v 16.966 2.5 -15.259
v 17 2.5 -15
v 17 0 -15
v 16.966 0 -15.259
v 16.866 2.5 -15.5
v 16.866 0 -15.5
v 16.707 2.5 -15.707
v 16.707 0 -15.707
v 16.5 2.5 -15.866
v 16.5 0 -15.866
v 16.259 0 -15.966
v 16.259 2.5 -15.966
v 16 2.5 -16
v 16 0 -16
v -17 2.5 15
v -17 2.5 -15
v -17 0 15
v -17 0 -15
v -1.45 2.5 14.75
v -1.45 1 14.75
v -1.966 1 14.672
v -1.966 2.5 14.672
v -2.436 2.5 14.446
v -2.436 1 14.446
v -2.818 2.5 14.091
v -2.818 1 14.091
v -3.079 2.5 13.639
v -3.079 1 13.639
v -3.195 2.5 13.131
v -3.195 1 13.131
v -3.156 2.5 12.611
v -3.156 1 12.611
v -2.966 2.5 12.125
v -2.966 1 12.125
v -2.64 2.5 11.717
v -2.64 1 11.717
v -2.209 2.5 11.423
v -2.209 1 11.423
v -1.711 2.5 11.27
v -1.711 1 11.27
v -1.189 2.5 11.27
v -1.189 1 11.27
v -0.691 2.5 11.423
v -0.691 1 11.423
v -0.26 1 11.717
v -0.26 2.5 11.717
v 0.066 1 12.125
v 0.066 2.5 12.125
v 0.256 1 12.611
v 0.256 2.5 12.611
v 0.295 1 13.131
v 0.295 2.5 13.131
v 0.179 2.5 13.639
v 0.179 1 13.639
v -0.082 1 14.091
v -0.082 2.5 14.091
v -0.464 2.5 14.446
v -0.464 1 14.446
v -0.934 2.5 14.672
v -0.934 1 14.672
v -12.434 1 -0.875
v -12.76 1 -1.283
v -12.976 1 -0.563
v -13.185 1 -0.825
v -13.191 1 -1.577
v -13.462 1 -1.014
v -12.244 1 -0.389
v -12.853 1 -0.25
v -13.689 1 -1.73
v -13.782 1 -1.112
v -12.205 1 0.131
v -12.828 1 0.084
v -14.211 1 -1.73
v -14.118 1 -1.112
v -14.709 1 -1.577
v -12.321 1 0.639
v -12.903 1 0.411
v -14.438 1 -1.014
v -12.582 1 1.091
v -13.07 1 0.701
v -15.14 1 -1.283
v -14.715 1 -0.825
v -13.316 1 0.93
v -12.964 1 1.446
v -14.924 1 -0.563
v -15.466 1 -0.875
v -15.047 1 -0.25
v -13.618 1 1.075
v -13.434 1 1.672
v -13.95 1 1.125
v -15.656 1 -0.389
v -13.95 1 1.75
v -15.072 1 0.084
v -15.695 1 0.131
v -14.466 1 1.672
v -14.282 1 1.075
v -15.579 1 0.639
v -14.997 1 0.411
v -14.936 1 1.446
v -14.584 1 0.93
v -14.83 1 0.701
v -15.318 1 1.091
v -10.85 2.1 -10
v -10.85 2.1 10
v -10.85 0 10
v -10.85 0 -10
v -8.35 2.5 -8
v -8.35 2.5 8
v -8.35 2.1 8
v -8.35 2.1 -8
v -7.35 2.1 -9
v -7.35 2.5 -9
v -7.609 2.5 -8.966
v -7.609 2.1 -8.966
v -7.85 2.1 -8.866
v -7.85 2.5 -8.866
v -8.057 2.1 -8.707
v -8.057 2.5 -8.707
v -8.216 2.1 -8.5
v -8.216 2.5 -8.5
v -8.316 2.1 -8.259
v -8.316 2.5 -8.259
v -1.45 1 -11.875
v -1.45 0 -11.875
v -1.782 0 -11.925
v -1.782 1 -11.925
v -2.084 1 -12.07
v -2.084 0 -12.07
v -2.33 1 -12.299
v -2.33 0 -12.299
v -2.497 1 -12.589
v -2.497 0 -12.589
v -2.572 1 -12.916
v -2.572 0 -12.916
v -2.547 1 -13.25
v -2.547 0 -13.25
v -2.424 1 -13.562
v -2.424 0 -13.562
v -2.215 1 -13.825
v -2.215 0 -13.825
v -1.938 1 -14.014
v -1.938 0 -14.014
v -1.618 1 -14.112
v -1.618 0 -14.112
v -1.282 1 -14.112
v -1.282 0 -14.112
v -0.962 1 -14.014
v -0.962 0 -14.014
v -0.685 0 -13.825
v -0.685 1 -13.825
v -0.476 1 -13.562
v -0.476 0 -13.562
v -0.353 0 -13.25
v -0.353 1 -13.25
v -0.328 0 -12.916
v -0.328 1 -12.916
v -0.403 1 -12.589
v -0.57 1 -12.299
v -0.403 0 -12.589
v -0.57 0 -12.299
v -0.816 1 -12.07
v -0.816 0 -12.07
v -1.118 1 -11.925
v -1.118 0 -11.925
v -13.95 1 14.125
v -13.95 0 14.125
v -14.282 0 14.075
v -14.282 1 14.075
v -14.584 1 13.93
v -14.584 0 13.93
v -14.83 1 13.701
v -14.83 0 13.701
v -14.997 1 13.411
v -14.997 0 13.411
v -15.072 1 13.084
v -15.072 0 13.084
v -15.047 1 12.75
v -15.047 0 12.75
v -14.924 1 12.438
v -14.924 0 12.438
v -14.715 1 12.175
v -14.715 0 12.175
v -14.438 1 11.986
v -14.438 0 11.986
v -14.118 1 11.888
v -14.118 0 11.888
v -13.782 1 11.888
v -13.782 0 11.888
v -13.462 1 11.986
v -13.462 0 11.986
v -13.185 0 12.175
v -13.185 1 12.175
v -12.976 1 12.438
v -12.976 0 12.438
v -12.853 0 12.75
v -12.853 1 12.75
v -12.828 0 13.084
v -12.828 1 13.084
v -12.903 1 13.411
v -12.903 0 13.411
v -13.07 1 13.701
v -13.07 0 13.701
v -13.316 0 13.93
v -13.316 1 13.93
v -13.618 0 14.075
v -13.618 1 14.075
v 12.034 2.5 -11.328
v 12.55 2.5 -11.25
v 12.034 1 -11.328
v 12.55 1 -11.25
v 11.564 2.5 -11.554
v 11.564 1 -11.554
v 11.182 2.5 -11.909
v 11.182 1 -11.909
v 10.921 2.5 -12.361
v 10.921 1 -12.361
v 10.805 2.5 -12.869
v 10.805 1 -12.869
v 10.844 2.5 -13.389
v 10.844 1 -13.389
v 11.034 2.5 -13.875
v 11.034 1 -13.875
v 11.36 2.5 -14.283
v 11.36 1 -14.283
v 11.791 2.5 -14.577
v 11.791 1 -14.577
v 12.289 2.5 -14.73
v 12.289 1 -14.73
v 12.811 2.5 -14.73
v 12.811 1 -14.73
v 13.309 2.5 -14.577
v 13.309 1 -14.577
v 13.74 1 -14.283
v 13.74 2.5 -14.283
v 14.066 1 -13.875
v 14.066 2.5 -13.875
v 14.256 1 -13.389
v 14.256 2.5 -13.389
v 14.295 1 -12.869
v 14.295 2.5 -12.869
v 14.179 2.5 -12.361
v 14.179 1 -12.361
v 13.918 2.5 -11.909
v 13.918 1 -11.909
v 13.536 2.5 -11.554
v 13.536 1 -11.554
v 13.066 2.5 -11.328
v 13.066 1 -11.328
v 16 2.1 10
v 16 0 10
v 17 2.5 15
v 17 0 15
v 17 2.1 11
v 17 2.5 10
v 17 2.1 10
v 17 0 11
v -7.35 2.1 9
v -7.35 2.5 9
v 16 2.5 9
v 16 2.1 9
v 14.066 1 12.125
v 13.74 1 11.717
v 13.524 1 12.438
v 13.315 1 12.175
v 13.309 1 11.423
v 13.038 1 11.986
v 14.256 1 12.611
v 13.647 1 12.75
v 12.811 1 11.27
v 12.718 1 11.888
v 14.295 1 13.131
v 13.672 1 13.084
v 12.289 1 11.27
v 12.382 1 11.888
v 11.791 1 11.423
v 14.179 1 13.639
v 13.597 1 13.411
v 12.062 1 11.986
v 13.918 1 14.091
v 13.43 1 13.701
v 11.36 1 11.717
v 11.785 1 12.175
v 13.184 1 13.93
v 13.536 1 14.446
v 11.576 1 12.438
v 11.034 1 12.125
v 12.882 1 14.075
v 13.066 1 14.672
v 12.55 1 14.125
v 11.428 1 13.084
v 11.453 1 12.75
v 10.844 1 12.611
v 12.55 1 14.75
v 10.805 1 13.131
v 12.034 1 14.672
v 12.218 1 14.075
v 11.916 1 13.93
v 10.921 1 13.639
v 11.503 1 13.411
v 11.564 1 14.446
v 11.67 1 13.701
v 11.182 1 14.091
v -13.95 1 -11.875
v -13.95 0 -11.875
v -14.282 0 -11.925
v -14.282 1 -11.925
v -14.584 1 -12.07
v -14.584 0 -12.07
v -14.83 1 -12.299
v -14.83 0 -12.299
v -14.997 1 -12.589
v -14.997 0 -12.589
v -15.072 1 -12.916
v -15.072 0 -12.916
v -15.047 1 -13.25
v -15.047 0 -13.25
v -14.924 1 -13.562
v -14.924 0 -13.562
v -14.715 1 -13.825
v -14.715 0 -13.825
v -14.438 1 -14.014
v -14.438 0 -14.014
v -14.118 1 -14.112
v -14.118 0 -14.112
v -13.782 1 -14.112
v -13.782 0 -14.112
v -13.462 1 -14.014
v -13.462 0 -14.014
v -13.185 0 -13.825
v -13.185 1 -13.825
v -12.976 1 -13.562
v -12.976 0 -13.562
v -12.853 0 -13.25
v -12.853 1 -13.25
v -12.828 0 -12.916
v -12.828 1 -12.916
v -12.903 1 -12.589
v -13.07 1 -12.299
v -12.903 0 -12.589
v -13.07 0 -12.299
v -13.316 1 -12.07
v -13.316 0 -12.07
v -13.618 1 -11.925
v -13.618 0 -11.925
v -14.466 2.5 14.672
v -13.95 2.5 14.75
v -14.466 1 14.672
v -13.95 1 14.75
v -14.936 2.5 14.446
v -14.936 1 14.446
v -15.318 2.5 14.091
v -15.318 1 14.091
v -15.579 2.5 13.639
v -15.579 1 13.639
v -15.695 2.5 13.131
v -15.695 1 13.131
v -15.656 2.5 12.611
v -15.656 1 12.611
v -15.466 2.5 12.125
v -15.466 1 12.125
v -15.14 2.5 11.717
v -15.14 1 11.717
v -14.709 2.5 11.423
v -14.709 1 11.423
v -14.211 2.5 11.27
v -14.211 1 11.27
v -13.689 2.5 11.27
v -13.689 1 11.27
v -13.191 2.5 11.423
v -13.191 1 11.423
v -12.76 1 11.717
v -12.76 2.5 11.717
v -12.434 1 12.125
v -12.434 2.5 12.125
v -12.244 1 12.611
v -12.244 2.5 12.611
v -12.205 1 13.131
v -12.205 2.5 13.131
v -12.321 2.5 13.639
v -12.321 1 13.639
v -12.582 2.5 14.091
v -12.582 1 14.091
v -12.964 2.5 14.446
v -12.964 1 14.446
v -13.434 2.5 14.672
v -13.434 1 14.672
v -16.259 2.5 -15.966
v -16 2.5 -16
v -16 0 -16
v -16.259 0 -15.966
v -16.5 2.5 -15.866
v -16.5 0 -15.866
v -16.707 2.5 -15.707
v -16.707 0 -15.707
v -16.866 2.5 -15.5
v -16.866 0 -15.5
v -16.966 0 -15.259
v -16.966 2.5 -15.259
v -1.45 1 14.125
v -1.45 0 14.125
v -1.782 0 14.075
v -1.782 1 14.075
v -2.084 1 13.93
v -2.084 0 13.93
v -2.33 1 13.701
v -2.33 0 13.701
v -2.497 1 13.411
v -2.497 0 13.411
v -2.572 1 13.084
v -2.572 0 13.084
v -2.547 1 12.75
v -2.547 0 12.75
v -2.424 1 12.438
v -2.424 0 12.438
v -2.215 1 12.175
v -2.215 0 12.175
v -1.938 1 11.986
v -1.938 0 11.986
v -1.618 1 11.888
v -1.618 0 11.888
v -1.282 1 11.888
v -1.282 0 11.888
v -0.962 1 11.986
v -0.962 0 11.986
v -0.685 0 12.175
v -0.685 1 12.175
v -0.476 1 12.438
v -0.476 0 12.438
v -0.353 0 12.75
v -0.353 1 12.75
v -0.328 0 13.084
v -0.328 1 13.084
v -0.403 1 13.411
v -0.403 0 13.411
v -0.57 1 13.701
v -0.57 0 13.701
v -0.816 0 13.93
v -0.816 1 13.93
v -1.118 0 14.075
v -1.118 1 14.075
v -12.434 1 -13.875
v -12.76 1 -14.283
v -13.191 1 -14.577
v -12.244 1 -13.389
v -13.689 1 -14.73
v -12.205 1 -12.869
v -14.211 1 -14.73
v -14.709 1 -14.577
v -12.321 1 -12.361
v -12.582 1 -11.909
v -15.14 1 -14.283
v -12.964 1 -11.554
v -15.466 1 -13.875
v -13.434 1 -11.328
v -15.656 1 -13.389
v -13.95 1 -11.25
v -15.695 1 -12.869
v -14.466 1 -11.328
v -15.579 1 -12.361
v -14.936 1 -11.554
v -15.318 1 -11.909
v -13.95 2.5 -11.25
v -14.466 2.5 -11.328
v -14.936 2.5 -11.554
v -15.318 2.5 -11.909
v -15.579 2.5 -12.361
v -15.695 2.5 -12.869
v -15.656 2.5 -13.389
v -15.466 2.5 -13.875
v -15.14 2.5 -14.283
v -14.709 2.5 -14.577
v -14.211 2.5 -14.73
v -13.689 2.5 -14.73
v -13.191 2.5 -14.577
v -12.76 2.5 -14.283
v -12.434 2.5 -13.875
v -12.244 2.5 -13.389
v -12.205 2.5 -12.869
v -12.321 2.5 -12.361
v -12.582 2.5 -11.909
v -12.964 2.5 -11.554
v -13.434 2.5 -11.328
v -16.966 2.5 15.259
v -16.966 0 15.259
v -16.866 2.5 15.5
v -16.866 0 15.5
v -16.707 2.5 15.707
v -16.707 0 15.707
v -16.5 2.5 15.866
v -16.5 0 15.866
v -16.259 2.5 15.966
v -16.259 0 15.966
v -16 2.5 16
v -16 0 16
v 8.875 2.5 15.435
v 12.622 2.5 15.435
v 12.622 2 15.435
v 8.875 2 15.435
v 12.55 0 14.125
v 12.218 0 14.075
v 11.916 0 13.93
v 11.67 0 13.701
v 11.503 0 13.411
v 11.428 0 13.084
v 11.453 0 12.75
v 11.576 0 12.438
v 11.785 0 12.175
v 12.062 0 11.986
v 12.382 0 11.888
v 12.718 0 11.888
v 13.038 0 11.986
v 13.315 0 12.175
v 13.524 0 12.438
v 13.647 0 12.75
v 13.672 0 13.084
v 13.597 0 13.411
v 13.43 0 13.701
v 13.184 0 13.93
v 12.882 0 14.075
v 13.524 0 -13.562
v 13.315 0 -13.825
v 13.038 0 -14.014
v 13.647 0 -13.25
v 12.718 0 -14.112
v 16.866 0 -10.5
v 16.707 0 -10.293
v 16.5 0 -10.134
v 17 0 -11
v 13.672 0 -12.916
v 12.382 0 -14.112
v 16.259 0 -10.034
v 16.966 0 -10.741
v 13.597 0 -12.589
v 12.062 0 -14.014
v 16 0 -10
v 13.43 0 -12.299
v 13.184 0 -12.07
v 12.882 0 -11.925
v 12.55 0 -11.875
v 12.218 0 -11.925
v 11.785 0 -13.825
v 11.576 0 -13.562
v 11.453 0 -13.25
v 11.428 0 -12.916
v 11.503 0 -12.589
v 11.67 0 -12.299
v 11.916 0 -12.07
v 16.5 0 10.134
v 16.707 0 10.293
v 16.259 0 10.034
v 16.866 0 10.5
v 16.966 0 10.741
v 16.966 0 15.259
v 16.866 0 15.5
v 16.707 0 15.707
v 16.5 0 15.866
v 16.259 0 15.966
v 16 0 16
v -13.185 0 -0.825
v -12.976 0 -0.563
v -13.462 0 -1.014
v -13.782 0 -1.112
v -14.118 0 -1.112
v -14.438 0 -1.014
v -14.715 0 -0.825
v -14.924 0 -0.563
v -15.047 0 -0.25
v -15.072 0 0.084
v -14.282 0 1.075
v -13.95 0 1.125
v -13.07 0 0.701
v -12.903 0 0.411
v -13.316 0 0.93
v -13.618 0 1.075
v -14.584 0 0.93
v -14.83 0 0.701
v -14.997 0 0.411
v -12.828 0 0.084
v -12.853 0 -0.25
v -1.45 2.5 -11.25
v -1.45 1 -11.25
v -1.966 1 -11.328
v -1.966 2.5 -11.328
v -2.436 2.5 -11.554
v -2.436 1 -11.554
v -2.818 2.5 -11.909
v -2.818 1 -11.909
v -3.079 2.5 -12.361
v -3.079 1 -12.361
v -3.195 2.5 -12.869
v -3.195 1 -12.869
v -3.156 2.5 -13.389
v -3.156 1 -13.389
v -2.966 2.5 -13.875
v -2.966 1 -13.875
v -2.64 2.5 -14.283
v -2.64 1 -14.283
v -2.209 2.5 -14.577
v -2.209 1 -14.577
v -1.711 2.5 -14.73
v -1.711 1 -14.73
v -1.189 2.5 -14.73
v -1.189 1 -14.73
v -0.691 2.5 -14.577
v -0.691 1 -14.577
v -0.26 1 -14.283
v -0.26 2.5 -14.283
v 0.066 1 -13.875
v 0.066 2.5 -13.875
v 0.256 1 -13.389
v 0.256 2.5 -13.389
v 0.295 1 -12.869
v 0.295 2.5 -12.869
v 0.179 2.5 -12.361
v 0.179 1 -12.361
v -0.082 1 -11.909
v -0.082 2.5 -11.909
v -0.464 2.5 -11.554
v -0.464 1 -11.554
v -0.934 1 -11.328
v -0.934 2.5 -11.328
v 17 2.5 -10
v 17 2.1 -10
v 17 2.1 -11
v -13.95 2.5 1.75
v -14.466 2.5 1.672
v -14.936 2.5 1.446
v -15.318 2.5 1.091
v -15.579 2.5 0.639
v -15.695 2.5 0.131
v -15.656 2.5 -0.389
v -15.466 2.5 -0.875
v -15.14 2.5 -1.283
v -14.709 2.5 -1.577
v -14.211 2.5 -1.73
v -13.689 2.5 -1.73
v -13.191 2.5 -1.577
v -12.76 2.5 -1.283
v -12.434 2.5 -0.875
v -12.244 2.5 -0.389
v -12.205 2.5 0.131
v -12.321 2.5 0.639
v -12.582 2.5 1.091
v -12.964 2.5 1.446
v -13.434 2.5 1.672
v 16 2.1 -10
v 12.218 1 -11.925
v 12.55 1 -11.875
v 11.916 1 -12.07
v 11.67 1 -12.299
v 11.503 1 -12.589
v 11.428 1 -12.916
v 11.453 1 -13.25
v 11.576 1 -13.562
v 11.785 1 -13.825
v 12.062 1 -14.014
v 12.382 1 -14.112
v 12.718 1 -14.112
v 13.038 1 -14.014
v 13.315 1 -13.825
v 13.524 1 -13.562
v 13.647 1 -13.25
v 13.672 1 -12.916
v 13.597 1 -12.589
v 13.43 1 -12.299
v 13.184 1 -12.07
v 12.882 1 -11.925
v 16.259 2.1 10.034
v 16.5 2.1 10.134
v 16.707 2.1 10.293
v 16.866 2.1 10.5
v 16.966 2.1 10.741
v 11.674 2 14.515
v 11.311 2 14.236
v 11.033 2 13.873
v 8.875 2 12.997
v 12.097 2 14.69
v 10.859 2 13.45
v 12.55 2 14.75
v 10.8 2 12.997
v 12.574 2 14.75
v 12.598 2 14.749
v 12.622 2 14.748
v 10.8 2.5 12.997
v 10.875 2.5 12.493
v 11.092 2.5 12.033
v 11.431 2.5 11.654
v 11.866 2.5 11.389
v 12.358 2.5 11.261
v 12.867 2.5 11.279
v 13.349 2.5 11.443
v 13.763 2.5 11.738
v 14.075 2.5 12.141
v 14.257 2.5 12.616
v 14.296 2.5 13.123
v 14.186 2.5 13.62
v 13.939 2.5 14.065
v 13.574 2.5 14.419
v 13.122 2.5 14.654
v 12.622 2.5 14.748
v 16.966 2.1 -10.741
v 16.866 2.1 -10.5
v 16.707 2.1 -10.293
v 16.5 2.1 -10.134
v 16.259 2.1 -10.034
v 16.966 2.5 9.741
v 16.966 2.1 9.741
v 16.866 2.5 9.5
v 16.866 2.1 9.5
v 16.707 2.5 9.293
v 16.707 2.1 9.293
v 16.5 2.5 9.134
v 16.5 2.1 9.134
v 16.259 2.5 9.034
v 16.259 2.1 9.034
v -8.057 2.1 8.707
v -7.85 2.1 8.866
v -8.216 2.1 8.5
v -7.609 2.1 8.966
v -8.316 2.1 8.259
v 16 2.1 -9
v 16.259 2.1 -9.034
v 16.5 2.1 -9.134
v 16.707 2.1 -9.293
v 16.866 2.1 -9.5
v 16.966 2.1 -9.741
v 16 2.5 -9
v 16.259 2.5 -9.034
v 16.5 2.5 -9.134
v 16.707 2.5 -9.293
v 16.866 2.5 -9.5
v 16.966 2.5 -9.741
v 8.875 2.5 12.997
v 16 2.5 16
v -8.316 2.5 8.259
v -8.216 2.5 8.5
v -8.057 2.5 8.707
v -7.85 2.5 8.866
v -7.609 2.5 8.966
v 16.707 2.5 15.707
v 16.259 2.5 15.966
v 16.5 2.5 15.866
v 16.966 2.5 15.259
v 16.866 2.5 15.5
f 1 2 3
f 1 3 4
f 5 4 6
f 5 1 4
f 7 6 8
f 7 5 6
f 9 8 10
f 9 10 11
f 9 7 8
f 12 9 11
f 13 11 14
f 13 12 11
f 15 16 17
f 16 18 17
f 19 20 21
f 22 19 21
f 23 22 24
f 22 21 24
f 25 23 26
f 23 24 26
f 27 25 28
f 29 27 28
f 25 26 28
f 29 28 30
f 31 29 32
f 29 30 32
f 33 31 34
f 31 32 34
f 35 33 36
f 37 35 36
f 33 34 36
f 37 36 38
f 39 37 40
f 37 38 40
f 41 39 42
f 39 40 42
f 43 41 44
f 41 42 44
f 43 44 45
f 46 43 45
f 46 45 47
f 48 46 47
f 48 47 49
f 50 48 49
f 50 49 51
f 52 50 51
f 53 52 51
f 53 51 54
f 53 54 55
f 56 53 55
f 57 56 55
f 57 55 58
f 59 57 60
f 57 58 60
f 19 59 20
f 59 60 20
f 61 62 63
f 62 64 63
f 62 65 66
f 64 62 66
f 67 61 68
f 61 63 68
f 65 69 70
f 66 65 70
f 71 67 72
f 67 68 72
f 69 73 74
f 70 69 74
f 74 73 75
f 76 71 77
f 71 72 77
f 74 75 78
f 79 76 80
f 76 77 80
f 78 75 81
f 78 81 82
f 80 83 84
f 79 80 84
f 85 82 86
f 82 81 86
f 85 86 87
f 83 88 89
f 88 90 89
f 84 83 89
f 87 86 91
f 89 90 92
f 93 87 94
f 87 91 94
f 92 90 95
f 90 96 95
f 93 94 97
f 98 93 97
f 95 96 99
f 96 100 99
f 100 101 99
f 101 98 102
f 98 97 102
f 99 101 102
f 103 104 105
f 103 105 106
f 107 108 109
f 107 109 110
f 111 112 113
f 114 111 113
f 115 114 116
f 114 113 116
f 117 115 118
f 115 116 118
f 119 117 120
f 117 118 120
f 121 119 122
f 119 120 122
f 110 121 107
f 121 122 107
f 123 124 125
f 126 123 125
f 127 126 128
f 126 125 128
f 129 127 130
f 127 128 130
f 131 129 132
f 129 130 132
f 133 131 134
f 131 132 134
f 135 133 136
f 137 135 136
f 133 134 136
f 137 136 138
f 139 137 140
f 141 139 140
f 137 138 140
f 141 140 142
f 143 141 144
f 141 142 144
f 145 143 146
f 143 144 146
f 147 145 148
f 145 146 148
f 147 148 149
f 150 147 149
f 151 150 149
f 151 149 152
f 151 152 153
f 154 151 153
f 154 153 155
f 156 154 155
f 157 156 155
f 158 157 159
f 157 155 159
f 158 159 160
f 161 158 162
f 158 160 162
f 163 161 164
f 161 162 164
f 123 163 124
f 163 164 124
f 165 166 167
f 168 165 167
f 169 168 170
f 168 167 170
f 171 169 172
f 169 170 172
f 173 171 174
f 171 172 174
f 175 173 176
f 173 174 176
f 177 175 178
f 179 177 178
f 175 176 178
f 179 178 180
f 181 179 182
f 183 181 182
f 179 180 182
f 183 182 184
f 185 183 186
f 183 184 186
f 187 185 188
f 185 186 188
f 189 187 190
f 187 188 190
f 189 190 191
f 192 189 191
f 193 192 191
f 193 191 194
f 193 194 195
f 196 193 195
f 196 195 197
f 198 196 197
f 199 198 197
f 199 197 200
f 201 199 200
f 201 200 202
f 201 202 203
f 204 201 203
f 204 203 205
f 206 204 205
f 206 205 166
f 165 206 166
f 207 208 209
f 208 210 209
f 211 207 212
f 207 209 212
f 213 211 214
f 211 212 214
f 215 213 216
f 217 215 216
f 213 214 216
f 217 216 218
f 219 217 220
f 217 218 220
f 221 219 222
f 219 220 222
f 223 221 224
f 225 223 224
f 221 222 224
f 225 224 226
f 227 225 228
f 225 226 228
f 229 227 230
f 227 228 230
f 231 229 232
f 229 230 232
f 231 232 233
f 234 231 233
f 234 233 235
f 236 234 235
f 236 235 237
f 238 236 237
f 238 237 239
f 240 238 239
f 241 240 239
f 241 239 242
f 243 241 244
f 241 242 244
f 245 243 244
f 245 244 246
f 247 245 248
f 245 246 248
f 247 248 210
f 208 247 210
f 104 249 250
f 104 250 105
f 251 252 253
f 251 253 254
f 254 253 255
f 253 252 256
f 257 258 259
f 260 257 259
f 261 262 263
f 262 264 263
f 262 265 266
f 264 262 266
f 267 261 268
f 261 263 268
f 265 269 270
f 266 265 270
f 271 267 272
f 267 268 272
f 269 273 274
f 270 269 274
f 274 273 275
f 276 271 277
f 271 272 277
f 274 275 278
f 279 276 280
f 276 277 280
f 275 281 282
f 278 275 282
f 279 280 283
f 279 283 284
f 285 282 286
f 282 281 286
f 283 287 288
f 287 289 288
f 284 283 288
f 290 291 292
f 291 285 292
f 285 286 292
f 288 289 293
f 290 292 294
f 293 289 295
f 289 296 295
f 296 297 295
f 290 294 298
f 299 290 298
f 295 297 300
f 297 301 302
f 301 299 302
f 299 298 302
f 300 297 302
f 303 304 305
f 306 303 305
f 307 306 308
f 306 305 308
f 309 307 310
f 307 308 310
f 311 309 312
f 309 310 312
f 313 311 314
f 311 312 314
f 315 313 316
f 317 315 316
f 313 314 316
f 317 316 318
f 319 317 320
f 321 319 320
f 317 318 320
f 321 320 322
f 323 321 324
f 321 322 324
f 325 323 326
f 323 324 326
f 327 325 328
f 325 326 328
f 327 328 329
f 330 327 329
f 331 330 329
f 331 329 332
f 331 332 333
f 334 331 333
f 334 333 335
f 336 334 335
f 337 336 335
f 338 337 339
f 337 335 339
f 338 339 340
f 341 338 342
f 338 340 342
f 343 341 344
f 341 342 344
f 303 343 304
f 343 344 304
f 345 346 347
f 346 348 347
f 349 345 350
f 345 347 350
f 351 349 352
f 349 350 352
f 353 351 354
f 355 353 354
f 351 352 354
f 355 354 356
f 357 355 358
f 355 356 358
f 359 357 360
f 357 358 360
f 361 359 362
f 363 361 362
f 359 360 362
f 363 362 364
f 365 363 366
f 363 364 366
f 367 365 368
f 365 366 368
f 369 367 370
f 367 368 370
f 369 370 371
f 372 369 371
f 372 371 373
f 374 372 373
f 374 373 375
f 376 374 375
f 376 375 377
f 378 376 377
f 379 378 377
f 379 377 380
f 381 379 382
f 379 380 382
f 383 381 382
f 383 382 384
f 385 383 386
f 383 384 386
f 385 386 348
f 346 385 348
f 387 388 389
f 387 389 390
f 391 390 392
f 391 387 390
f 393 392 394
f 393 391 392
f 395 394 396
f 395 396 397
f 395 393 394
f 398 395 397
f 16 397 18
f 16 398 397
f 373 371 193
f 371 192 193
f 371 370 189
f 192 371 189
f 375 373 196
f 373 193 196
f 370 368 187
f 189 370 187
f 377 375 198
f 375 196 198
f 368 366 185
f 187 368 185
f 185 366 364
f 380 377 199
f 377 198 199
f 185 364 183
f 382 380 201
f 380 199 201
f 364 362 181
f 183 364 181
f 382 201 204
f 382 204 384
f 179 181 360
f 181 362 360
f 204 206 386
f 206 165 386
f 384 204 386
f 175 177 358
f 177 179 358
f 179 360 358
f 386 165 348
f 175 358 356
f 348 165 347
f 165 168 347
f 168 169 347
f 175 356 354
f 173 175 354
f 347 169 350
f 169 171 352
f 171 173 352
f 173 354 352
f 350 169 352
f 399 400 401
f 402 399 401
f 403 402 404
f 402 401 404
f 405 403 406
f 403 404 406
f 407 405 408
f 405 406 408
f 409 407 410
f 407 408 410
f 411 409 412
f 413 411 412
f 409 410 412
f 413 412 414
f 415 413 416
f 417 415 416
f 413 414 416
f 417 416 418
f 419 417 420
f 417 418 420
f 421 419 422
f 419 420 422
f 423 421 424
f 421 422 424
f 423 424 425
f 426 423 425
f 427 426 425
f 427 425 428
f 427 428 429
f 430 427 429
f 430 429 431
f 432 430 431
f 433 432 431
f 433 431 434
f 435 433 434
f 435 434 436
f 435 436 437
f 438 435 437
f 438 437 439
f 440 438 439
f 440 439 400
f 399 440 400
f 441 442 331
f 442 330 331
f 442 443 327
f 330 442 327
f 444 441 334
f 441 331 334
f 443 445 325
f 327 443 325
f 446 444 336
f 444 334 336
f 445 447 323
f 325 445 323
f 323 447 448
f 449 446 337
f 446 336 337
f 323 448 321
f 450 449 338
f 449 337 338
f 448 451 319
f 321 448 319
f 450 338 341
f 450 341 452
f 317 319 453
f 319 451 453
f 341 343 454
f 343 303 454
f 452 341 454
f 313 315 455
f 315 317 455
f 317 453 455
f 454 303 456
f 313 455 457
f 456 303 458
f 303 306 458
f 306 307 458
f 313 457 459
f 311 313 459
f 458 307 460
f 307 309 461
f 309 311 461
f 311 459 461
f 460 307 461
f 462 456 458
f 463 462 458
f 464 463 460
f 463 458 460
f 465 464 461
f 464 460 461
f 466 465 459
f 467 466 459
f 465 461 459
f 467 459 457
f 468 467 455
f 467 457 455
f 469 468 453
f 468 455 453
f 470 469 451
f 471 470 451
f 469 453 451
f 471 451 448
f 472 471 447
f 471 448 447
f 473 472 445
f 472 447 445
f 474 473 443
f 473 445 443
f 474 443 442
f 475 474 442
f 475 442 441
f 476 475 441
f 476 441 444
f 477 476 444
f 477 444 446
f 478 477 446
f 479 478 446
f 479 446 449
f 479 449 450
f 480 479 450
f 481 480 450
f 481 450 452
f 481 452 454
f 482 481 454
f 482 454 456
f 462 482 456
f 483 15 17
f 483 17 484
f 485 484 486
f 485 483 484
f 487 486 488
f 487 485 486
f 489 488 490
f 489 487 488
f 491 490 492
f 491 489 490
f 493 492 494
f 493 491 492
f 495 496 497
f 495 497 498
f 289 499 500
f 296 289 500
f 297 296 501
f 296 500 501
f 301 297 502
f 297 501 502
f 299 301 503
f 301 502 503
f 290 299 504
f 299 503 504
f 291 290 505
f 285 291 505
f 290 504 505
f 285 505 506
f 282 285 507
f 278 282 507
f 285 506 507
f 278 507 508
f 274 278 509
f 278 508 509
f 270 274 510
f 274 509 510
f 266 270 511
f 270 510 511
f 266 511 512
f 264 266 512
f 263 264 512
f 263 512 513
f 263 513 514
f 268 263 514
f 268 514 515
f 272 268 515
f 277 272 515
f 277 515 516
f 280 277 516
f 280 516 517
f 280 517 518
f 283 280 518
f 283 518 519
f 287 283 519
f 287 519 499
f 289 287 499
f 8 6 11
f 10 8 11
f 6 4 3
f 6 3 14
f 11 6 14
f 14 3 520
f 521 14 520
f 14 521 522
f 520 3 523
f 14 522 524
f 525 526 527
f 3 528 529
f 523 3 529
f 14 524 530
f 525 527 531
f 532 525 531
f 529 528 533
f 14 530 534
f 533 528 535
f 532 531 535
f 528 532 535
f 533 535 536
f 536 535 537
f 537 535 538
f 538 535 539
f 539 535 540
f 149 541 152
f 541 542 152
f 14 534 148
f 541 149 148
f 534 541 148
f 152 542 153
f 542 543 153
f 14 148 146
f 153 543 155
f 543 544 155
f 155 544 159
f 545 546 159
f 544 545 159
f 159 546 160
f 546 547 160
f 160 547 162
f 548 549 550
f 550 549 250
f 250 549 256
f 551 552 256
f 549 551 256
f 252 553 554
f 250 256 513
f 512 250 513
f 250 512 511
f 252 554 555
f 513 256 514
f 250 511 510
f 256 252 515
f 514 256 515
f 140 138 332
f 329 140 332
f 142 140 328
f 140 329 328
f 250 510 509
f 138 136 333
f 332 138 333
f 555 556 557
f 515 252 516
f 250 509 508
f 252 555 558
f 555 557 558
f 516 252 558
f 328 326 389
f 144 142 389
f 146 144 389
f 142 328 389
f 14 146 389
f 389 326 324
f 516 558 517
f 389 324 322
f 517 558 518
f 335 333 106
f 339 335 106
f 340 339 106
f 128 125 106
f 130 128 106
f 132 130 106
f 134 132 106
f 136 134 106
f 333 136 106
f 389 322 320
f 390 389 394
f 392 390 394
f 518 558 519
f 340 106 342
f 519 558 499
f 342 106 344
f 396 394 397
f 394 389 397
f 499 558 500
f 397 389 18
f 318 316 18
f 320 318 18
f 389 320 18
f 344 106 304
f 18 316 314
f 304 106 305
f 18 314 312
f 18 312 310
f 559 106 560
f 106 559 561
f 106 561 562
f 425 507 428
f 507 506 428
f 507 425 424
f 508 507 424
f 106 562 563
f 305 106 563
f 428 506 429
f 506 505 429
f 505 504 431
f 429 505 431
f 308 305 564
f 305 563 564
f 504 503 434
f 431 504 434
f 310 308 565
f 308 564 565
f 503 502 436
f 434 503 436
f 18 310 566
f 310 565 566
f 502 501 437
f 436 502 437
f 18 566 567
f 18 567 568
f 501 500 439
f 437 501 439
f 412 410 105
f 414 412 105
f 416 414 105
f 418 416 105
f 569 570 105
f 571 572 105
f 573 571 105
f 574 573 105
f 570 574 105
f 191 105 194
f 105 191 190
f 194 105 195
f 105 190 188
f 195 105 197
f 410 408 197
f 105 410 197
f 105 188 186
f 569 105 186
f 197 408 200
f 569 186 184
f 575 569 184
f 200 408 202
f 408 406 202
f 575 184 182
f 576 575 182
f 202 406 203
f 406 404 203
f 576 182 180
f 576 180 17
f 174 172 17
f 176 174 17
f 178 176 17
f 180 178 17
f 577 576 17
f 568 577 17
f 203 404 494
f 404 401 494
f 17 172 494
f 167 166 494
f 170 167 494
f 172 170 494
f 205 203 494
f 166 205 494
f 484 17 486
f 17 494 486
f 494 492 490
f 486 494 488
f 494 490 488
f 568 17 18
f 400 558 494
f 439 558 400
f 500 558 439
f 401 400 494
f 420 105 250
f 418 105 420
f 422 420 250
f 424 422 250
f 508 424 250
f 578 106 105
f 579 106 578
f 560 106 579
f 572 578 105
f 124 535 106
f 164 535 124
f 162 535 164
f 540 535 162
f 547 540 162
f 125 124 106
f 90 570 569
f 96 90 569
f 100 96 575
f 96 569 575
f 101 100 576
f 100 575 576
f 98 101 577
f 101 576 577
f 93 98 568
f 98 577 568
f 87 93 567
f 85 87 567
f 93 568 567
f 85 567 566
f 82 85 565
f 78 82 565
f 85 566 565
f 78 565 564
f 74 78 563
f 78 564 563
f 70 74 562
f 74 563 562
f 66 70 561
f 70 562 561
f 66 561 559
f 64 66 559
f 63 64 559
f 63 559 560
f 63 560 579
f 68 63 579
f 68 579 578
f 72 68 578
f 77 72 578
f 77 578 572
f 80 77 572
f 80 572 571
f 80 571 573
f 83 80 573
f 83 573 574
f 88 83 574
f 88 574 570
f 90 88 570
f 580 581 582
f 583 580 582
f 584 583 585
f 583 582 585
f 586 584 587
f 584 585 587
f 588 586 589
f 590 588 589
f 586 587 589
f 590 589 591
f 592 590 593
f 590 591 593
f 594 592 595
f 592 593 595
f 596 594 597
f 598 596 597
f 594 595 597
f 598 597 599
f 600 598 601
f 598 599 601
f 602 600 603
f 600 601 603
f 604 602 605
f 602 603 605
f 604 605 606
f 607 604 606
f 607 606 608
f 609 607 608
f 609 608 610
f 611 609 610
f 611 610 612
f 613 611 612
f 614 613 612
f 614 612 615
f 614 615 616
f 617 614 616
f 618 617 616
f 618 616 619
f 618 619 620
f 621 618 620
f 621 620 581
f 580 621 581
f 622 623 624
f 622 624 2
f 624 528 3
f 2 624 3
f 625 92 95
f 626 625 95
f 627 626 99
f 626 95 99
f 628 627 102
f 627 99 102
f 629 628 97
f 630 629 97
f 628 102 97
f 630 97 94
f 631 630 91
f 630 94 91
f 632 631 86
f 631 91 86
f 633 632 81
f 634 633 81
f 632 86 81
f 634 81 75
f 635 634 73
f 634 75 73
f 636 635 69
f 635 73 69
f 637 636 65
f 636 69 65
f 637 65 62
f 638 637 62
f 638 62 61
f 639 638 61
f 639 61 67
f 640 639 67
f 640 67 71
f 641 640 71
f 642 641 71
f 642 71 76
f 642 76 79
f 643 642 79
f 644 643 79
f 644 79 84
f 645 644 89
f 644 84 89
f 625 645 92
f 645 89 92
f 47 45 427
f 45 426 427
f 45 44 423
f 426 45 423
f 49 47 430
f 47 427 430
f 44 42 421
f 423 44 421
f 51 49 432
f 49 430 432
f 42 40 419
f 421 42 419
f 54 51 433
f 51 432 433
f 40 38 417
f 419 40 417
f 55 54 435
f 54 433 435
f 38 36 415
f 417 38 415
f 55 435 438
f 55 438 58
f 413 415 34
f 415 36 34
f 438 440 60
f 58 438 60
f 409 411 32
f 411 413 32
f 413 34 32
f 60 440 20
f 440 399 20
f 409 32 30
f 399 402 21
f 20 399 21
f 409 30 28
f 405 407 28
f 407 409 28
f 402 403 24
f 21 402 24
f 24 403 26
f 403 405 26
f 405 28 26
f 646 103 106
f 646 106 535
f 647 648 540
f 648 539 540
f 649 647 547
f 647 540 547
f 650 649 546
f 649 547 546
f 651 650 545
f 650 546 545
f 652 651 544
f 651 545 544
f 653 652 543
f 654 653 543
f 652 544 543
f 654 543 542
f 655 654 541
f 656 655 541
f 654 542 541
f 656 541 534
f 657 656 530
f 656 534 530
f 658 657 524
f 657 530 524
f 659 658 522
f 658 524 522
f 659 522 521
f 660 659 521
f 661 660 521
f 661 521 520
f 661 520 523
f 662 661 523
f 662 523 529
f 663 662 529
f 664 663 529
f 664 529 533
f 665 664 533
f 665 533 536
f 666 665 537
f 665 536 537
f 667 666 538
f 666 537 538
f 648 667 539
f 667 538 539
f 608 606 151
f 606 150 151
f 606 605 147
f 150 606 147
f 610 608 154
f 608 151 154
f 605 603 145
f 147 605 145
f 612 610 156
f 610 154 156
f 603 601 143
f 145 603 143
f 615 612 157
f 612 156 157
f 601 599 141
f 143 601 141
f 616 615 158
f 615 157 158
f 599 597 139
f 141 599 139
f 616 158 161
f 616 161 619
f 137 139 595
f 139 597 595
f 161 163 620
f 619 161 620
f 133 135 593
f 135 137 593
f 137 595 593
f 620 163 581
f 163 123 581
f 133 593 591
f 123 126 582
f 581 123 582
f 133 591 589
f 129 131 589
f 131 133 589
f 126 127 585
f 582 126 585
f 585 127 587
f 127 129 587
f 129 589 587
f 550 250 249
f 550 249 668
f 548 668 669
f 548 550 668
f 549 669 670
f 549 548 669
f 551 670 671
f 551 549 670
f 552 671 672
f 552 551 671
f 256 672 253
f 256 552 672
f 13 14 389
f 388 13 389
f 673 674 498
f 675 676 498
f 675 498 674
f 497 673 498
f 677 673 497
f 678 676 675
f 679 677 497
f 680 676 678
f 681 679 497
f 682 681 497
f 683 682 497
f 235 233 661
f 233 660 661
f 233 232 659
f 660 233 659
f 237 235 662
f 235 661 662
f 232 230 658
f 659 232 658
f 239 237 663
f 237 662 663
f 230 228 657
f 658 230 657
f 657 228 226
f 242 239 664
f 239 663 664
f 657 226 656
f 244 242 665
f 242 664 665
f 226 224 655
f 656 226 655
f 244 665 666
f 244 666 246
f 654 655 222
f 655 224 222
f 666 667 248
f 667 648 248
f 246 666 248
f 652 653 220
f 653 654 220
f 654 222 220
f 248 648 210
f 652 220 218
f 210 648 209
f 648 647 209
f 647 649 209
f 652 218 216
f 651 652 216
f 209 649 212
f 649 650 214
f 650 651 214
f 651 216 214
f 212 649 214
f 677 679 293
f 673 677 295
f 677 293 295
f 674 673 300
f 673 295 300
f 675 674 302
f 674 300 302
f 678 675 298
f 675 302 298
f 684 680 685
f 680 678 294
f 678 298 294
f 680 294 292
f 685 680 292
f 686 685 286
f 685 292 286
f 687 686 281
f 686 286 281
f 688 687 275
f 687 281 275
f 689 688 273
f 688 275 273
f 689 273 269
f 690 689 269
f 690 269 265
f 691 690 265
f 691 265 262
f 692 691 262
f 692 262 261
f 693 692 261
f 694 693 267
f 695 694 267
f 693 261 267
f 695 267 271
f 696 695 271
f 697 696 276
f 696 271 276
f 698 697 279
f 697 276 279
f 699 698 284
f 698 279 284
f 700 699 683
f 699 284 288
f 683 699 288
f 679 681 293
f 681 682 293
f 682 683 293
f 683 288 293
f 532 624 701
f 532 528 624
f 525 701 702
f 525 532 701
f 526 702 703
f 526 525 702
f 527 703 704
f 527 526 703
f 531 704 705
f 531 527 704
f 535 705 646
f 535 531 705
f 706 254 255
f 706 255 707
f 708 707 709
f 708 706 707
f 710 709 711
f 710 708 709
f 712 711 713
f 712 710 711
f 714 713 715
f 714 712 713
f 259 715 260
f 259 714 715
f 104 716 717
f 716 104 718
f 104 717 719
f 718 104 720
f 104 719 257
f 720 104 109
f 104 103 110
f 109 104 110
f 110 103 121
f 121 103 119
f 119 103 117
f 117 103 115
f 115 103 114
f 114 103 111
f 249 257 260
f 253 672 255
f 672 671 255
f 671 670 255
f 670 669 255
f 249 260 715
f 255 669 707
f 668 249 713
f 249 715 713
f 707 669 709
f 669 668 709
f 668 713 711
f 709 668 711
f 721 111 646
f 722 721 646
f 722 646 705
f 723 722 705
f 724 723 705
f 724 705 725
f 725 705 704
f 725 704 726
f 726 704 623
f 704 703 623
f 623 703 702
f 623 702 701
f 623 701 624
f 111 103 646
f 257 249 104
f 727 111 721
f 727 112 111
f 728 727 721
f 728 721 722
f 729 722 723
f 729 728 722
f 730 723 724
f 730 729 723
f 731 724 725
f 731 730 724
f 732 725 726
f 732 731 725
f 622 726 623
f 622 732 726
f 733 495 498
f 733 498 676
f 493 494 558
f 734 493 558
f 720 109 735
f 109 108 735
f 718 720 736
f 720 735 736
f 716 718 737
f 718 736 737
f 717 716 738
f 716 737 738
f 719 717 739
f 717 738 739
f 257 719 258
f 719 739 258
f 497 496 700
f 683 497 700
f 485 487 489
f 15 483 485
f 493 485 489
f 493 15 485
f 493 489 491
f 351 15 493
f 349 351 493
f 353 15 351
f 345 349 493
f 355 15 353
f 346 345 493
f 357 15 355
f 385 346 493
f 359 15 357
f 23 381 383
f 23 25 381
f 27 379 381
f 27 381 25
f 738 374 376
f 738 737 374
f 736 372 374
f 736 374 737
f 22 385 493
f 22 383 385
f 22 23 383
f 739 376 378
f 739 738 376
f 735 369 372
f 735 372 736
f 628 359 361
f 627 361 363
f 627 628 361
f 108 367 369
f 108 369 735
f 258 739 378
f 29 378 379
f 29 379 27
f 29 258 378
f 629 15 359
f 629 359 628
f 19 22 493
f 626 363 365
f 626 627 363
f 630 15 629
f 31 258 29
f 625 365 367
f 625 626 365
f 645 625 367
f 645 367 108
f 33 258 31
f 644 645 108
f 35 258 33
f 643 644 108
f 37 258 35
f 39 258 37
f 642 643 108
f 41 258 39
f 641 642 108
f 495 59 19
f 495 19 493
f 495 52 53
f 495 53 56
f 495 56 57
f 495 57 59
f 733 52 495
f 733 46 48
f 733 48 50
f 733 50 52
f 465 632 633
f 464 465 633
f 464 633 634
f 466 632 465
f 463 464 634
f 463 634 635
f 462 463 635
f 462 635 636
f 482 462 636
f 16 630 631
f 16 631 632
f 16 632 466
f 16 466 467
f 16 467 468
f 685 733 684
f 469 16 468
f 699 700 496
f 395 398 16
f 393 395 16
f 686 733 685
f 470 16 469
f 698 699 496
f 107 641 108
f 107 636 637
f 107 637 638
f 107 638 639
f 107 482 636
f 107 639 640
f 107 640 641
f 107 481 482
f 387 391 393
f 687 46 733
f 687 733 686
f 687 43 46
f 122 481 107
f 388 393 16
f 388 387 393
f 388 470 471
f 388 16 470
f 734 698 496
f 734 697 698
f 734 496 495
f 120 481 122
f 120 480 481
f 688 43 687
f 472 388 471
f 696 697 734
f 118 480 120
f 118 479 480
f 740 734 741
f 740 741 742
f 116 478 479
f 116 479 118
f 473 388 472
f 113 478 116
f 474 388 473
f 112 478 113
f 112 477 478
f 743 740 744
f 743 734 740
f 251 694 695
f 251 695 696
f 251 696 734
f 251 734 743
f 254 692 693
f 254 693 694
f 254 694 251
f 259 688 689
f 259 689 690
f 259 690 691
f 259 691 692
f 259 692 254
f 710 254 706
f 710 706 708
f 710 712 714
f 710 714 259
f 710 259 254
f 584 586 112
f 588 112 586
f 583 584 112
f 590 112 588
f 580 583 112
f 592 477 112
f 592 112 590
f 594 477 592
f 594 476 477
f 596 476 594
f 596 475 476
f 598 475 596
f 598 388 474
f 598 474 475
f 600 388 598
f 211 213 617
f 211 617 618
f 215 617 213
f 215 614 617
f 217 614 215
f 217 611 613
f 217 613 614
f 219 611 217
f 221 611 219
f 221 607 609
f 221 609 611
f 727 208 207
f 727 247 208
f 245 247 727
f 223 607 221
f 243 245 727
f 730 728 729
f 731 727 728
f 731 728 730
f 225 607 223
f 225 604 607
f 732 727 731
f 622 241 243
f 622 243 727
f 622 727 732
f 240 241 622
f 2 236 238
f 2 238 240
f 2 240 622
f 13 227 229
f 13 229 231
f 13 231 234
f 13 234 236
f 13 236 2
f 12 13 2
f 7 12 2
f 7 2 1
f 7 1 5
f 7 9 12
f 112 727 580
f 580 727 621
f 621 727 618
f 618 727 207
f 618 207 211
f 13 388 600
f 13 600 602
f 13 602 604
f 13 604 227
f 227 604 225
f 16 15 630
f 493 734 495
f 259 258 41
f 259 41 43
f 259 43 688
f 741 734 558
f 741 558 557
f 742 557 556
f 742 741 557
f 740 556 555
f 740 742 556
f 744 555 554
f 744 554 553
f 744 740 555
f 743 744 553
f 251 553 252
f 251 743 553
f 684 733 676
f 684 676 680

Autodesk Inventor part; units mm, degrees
ref_plane "YZ Plane" through (0, 0, 0) normal (1, 0, 0) x (0, 1, 0)
ref_plane "XZ Plane" through (0, 0, 0) normal (0, 1, 0) x (-1, 0, 0)
ref_plane "XY Plane" through (0, 0, 0) normal (0, 0, 1) x (1, 0, 0)
sketch "Sketch1" plane through (0, 0, 0) normal (0, 1, 0) x (-1, 0, 0)
  line L0 (-17, -16) -> (17, -16)
  line L1 (17, -16) -> (17, 16)
  line L2 (17, 16) -> (-17, 16)
  line L3 (-17, 16) -> (-17, -16)
  line L4 (-17, -16) -> (17, 16) construction
  line L5 (17, -16) -> (-17, 16) construction
  point P0 (0, 0)
  dimension "d0" = 32
  dimension "d1" = 34
extrude "Extrusion1" add sketch "Sketch1" along normal blind 2.5
sketch "Sketch2" plane through (0, 2.5, 0) normal (0, 1, 0) x (1, 0, 0)
  line L0 (17, -16) -> (17, 16) projected
  line L1 (17, -10) -> (-10.85, -10)
  line L2 (-10.85, -10) -> (-10.85, 10)
  line L3 (-10.85, 10) -> (17, 10)
  line L4 (17, 10) -> (17, -10)
  point P0 (0, 0)
  point P1 (17, 10)
  dimension "d4" = 20
  dimension "d5" = 10
  dimension "d6" = 27.85
extrude "Extrusion2" cut sketch "Sketch2" against normal through all
sketch "Sketch3" plane through (0, 2.5, 0) normal (0, 1, 0) x (1, 0, 0)
  line L0 (17, -10) -> (-10.85, -10) projected
  line L1 (-10.85, -10) -> (-10.85, 10) projected
  line L2 (-10.85, 10) -> (17, 10) projected
  line L3 (17, -10) -> (-10.85, -10)
  line L4 (-10.85, -10) -> (-10.85, -9)
  line L5 (-7.35, -9) -> (16, -9)
  line L6 (17, -10) -> (17, -10)
  line L7 (17, 10) -> (-10.85, 10)
  line L8 (-10.85, 10) -> (-10.85, 9)
  line L9 (-7.35, 9) -> (16, 9)
  line L10 (17, 10) -> (17, 10)
  line L11 (-10.85, -10) -> (-8.35, -10)
  line L12 (-8.35, -8) -> (-8.35, 8)
  line L13 (-8.35, 10) -> (-10.85, 10)
  line L14 (-10.85, 10) -> (-10.85, -10)
  arc A0 (17, -10) -> (16, -9) centre (16, -10) ccw
  arc A1 (-8.35, -8) -> (-7.35, -9) centre (-7.35, -8) ccw
  arc A2 (-7.35, 9) -> (-8.35, 8) centre (-7.35, 8) ccw
  arc A3 (16, 9) -> (17, 10) centre (16, 10) ccw
  point P0 (0, 0)
  point P1 (17, -9)
  point P2 (17, 9)
  point P3 (-7.5, -9)
  point P4 (-7.5, 9)
  point P5 (17, 10)
  dimension "d9" = 1
  dimension "d10" = 1
  dimension "d11" = 2.5
  dimension "d14" = 1
extrude "Extrusion3" add sketch "Sketch3" against normal blind 0.4
sketch "Sketch4" plane through (0, 2.5, 0) normal (0, 1, 0) x (1, 0, 0)
  line L0 (-10.85, 10) -> (-10.85, -10) projected
  line L1 (-17, 16) -> (-17, -16) projected
  line L2 (-10.85, 10) -> (-10.85, -10) projected
  line L3 (-10.85, 10) -> (-10.85, -10) projected
  point P0 (0, 0)
  point P1 (12.55, -13)
  point P2 (-13.95, -13)
  point P3 (-13.95, 13)
  point P4 (12.55, 13)
  point P5 (-13.95, 0)
  point P6 (-1.45, -13)
  point P7 (-1.45, 13)
  dimension "d27" = 13
  dimension "d28" = 13
  dimension "d29" = 12.5
  dimension "d30" = 14
  dimension "d31" = 3.1
hole "Hole1" at (12.55, 2.5, 13) at (-13.95, 2.5, 13) at (-13.95, 2.5, -13) at (12.55, 2.5, -13) at (-1.45, 2.5, 13) at (-1.45, 2.5, -13) at (-13.95, 2.5, 0) direction (0, -1, 0) diameter 2.25 end through all counterbore diameter 3.5 counterbore depth 1.5
fillet "Fillet1" radius 1 6 edges at (-17, 1.25, 16) (-17, 1.25, -16) (17, 1.05, 10) (17, 1.25, 16) (17, 1.05, -10) (17, 1.25, -16)
sketch "Sketch5" plane through (0, 2.5, 0) normal (0, 1, 0) x (1, 0, 0)
  circle A0 centre (12.55, -13) radius 1.75 projected
  line L0 (12.6221, -15.435) -> (8.8746, -15.435)
  line L1 (8.8746, -15.435) -> (8.8746, -12.9967)
  line L2 (8.8746, -12.9967) -> (10.8, -12.9967)
  line L3 (12.6221, -15.435) -> (12.6221, -14.7485)
  point P0 (0, 0)
extrude "Extrusion4" cut sketch "Sketch5" against normal blind 0.5 contours A0 L3 L0 L1 L2
equation "\"d5\" = 0.5 * d4"
equation "\"d10\" = d9"
equation "\"d28\" = d27"
properties part number "Flex Circuit Clamp V2"
